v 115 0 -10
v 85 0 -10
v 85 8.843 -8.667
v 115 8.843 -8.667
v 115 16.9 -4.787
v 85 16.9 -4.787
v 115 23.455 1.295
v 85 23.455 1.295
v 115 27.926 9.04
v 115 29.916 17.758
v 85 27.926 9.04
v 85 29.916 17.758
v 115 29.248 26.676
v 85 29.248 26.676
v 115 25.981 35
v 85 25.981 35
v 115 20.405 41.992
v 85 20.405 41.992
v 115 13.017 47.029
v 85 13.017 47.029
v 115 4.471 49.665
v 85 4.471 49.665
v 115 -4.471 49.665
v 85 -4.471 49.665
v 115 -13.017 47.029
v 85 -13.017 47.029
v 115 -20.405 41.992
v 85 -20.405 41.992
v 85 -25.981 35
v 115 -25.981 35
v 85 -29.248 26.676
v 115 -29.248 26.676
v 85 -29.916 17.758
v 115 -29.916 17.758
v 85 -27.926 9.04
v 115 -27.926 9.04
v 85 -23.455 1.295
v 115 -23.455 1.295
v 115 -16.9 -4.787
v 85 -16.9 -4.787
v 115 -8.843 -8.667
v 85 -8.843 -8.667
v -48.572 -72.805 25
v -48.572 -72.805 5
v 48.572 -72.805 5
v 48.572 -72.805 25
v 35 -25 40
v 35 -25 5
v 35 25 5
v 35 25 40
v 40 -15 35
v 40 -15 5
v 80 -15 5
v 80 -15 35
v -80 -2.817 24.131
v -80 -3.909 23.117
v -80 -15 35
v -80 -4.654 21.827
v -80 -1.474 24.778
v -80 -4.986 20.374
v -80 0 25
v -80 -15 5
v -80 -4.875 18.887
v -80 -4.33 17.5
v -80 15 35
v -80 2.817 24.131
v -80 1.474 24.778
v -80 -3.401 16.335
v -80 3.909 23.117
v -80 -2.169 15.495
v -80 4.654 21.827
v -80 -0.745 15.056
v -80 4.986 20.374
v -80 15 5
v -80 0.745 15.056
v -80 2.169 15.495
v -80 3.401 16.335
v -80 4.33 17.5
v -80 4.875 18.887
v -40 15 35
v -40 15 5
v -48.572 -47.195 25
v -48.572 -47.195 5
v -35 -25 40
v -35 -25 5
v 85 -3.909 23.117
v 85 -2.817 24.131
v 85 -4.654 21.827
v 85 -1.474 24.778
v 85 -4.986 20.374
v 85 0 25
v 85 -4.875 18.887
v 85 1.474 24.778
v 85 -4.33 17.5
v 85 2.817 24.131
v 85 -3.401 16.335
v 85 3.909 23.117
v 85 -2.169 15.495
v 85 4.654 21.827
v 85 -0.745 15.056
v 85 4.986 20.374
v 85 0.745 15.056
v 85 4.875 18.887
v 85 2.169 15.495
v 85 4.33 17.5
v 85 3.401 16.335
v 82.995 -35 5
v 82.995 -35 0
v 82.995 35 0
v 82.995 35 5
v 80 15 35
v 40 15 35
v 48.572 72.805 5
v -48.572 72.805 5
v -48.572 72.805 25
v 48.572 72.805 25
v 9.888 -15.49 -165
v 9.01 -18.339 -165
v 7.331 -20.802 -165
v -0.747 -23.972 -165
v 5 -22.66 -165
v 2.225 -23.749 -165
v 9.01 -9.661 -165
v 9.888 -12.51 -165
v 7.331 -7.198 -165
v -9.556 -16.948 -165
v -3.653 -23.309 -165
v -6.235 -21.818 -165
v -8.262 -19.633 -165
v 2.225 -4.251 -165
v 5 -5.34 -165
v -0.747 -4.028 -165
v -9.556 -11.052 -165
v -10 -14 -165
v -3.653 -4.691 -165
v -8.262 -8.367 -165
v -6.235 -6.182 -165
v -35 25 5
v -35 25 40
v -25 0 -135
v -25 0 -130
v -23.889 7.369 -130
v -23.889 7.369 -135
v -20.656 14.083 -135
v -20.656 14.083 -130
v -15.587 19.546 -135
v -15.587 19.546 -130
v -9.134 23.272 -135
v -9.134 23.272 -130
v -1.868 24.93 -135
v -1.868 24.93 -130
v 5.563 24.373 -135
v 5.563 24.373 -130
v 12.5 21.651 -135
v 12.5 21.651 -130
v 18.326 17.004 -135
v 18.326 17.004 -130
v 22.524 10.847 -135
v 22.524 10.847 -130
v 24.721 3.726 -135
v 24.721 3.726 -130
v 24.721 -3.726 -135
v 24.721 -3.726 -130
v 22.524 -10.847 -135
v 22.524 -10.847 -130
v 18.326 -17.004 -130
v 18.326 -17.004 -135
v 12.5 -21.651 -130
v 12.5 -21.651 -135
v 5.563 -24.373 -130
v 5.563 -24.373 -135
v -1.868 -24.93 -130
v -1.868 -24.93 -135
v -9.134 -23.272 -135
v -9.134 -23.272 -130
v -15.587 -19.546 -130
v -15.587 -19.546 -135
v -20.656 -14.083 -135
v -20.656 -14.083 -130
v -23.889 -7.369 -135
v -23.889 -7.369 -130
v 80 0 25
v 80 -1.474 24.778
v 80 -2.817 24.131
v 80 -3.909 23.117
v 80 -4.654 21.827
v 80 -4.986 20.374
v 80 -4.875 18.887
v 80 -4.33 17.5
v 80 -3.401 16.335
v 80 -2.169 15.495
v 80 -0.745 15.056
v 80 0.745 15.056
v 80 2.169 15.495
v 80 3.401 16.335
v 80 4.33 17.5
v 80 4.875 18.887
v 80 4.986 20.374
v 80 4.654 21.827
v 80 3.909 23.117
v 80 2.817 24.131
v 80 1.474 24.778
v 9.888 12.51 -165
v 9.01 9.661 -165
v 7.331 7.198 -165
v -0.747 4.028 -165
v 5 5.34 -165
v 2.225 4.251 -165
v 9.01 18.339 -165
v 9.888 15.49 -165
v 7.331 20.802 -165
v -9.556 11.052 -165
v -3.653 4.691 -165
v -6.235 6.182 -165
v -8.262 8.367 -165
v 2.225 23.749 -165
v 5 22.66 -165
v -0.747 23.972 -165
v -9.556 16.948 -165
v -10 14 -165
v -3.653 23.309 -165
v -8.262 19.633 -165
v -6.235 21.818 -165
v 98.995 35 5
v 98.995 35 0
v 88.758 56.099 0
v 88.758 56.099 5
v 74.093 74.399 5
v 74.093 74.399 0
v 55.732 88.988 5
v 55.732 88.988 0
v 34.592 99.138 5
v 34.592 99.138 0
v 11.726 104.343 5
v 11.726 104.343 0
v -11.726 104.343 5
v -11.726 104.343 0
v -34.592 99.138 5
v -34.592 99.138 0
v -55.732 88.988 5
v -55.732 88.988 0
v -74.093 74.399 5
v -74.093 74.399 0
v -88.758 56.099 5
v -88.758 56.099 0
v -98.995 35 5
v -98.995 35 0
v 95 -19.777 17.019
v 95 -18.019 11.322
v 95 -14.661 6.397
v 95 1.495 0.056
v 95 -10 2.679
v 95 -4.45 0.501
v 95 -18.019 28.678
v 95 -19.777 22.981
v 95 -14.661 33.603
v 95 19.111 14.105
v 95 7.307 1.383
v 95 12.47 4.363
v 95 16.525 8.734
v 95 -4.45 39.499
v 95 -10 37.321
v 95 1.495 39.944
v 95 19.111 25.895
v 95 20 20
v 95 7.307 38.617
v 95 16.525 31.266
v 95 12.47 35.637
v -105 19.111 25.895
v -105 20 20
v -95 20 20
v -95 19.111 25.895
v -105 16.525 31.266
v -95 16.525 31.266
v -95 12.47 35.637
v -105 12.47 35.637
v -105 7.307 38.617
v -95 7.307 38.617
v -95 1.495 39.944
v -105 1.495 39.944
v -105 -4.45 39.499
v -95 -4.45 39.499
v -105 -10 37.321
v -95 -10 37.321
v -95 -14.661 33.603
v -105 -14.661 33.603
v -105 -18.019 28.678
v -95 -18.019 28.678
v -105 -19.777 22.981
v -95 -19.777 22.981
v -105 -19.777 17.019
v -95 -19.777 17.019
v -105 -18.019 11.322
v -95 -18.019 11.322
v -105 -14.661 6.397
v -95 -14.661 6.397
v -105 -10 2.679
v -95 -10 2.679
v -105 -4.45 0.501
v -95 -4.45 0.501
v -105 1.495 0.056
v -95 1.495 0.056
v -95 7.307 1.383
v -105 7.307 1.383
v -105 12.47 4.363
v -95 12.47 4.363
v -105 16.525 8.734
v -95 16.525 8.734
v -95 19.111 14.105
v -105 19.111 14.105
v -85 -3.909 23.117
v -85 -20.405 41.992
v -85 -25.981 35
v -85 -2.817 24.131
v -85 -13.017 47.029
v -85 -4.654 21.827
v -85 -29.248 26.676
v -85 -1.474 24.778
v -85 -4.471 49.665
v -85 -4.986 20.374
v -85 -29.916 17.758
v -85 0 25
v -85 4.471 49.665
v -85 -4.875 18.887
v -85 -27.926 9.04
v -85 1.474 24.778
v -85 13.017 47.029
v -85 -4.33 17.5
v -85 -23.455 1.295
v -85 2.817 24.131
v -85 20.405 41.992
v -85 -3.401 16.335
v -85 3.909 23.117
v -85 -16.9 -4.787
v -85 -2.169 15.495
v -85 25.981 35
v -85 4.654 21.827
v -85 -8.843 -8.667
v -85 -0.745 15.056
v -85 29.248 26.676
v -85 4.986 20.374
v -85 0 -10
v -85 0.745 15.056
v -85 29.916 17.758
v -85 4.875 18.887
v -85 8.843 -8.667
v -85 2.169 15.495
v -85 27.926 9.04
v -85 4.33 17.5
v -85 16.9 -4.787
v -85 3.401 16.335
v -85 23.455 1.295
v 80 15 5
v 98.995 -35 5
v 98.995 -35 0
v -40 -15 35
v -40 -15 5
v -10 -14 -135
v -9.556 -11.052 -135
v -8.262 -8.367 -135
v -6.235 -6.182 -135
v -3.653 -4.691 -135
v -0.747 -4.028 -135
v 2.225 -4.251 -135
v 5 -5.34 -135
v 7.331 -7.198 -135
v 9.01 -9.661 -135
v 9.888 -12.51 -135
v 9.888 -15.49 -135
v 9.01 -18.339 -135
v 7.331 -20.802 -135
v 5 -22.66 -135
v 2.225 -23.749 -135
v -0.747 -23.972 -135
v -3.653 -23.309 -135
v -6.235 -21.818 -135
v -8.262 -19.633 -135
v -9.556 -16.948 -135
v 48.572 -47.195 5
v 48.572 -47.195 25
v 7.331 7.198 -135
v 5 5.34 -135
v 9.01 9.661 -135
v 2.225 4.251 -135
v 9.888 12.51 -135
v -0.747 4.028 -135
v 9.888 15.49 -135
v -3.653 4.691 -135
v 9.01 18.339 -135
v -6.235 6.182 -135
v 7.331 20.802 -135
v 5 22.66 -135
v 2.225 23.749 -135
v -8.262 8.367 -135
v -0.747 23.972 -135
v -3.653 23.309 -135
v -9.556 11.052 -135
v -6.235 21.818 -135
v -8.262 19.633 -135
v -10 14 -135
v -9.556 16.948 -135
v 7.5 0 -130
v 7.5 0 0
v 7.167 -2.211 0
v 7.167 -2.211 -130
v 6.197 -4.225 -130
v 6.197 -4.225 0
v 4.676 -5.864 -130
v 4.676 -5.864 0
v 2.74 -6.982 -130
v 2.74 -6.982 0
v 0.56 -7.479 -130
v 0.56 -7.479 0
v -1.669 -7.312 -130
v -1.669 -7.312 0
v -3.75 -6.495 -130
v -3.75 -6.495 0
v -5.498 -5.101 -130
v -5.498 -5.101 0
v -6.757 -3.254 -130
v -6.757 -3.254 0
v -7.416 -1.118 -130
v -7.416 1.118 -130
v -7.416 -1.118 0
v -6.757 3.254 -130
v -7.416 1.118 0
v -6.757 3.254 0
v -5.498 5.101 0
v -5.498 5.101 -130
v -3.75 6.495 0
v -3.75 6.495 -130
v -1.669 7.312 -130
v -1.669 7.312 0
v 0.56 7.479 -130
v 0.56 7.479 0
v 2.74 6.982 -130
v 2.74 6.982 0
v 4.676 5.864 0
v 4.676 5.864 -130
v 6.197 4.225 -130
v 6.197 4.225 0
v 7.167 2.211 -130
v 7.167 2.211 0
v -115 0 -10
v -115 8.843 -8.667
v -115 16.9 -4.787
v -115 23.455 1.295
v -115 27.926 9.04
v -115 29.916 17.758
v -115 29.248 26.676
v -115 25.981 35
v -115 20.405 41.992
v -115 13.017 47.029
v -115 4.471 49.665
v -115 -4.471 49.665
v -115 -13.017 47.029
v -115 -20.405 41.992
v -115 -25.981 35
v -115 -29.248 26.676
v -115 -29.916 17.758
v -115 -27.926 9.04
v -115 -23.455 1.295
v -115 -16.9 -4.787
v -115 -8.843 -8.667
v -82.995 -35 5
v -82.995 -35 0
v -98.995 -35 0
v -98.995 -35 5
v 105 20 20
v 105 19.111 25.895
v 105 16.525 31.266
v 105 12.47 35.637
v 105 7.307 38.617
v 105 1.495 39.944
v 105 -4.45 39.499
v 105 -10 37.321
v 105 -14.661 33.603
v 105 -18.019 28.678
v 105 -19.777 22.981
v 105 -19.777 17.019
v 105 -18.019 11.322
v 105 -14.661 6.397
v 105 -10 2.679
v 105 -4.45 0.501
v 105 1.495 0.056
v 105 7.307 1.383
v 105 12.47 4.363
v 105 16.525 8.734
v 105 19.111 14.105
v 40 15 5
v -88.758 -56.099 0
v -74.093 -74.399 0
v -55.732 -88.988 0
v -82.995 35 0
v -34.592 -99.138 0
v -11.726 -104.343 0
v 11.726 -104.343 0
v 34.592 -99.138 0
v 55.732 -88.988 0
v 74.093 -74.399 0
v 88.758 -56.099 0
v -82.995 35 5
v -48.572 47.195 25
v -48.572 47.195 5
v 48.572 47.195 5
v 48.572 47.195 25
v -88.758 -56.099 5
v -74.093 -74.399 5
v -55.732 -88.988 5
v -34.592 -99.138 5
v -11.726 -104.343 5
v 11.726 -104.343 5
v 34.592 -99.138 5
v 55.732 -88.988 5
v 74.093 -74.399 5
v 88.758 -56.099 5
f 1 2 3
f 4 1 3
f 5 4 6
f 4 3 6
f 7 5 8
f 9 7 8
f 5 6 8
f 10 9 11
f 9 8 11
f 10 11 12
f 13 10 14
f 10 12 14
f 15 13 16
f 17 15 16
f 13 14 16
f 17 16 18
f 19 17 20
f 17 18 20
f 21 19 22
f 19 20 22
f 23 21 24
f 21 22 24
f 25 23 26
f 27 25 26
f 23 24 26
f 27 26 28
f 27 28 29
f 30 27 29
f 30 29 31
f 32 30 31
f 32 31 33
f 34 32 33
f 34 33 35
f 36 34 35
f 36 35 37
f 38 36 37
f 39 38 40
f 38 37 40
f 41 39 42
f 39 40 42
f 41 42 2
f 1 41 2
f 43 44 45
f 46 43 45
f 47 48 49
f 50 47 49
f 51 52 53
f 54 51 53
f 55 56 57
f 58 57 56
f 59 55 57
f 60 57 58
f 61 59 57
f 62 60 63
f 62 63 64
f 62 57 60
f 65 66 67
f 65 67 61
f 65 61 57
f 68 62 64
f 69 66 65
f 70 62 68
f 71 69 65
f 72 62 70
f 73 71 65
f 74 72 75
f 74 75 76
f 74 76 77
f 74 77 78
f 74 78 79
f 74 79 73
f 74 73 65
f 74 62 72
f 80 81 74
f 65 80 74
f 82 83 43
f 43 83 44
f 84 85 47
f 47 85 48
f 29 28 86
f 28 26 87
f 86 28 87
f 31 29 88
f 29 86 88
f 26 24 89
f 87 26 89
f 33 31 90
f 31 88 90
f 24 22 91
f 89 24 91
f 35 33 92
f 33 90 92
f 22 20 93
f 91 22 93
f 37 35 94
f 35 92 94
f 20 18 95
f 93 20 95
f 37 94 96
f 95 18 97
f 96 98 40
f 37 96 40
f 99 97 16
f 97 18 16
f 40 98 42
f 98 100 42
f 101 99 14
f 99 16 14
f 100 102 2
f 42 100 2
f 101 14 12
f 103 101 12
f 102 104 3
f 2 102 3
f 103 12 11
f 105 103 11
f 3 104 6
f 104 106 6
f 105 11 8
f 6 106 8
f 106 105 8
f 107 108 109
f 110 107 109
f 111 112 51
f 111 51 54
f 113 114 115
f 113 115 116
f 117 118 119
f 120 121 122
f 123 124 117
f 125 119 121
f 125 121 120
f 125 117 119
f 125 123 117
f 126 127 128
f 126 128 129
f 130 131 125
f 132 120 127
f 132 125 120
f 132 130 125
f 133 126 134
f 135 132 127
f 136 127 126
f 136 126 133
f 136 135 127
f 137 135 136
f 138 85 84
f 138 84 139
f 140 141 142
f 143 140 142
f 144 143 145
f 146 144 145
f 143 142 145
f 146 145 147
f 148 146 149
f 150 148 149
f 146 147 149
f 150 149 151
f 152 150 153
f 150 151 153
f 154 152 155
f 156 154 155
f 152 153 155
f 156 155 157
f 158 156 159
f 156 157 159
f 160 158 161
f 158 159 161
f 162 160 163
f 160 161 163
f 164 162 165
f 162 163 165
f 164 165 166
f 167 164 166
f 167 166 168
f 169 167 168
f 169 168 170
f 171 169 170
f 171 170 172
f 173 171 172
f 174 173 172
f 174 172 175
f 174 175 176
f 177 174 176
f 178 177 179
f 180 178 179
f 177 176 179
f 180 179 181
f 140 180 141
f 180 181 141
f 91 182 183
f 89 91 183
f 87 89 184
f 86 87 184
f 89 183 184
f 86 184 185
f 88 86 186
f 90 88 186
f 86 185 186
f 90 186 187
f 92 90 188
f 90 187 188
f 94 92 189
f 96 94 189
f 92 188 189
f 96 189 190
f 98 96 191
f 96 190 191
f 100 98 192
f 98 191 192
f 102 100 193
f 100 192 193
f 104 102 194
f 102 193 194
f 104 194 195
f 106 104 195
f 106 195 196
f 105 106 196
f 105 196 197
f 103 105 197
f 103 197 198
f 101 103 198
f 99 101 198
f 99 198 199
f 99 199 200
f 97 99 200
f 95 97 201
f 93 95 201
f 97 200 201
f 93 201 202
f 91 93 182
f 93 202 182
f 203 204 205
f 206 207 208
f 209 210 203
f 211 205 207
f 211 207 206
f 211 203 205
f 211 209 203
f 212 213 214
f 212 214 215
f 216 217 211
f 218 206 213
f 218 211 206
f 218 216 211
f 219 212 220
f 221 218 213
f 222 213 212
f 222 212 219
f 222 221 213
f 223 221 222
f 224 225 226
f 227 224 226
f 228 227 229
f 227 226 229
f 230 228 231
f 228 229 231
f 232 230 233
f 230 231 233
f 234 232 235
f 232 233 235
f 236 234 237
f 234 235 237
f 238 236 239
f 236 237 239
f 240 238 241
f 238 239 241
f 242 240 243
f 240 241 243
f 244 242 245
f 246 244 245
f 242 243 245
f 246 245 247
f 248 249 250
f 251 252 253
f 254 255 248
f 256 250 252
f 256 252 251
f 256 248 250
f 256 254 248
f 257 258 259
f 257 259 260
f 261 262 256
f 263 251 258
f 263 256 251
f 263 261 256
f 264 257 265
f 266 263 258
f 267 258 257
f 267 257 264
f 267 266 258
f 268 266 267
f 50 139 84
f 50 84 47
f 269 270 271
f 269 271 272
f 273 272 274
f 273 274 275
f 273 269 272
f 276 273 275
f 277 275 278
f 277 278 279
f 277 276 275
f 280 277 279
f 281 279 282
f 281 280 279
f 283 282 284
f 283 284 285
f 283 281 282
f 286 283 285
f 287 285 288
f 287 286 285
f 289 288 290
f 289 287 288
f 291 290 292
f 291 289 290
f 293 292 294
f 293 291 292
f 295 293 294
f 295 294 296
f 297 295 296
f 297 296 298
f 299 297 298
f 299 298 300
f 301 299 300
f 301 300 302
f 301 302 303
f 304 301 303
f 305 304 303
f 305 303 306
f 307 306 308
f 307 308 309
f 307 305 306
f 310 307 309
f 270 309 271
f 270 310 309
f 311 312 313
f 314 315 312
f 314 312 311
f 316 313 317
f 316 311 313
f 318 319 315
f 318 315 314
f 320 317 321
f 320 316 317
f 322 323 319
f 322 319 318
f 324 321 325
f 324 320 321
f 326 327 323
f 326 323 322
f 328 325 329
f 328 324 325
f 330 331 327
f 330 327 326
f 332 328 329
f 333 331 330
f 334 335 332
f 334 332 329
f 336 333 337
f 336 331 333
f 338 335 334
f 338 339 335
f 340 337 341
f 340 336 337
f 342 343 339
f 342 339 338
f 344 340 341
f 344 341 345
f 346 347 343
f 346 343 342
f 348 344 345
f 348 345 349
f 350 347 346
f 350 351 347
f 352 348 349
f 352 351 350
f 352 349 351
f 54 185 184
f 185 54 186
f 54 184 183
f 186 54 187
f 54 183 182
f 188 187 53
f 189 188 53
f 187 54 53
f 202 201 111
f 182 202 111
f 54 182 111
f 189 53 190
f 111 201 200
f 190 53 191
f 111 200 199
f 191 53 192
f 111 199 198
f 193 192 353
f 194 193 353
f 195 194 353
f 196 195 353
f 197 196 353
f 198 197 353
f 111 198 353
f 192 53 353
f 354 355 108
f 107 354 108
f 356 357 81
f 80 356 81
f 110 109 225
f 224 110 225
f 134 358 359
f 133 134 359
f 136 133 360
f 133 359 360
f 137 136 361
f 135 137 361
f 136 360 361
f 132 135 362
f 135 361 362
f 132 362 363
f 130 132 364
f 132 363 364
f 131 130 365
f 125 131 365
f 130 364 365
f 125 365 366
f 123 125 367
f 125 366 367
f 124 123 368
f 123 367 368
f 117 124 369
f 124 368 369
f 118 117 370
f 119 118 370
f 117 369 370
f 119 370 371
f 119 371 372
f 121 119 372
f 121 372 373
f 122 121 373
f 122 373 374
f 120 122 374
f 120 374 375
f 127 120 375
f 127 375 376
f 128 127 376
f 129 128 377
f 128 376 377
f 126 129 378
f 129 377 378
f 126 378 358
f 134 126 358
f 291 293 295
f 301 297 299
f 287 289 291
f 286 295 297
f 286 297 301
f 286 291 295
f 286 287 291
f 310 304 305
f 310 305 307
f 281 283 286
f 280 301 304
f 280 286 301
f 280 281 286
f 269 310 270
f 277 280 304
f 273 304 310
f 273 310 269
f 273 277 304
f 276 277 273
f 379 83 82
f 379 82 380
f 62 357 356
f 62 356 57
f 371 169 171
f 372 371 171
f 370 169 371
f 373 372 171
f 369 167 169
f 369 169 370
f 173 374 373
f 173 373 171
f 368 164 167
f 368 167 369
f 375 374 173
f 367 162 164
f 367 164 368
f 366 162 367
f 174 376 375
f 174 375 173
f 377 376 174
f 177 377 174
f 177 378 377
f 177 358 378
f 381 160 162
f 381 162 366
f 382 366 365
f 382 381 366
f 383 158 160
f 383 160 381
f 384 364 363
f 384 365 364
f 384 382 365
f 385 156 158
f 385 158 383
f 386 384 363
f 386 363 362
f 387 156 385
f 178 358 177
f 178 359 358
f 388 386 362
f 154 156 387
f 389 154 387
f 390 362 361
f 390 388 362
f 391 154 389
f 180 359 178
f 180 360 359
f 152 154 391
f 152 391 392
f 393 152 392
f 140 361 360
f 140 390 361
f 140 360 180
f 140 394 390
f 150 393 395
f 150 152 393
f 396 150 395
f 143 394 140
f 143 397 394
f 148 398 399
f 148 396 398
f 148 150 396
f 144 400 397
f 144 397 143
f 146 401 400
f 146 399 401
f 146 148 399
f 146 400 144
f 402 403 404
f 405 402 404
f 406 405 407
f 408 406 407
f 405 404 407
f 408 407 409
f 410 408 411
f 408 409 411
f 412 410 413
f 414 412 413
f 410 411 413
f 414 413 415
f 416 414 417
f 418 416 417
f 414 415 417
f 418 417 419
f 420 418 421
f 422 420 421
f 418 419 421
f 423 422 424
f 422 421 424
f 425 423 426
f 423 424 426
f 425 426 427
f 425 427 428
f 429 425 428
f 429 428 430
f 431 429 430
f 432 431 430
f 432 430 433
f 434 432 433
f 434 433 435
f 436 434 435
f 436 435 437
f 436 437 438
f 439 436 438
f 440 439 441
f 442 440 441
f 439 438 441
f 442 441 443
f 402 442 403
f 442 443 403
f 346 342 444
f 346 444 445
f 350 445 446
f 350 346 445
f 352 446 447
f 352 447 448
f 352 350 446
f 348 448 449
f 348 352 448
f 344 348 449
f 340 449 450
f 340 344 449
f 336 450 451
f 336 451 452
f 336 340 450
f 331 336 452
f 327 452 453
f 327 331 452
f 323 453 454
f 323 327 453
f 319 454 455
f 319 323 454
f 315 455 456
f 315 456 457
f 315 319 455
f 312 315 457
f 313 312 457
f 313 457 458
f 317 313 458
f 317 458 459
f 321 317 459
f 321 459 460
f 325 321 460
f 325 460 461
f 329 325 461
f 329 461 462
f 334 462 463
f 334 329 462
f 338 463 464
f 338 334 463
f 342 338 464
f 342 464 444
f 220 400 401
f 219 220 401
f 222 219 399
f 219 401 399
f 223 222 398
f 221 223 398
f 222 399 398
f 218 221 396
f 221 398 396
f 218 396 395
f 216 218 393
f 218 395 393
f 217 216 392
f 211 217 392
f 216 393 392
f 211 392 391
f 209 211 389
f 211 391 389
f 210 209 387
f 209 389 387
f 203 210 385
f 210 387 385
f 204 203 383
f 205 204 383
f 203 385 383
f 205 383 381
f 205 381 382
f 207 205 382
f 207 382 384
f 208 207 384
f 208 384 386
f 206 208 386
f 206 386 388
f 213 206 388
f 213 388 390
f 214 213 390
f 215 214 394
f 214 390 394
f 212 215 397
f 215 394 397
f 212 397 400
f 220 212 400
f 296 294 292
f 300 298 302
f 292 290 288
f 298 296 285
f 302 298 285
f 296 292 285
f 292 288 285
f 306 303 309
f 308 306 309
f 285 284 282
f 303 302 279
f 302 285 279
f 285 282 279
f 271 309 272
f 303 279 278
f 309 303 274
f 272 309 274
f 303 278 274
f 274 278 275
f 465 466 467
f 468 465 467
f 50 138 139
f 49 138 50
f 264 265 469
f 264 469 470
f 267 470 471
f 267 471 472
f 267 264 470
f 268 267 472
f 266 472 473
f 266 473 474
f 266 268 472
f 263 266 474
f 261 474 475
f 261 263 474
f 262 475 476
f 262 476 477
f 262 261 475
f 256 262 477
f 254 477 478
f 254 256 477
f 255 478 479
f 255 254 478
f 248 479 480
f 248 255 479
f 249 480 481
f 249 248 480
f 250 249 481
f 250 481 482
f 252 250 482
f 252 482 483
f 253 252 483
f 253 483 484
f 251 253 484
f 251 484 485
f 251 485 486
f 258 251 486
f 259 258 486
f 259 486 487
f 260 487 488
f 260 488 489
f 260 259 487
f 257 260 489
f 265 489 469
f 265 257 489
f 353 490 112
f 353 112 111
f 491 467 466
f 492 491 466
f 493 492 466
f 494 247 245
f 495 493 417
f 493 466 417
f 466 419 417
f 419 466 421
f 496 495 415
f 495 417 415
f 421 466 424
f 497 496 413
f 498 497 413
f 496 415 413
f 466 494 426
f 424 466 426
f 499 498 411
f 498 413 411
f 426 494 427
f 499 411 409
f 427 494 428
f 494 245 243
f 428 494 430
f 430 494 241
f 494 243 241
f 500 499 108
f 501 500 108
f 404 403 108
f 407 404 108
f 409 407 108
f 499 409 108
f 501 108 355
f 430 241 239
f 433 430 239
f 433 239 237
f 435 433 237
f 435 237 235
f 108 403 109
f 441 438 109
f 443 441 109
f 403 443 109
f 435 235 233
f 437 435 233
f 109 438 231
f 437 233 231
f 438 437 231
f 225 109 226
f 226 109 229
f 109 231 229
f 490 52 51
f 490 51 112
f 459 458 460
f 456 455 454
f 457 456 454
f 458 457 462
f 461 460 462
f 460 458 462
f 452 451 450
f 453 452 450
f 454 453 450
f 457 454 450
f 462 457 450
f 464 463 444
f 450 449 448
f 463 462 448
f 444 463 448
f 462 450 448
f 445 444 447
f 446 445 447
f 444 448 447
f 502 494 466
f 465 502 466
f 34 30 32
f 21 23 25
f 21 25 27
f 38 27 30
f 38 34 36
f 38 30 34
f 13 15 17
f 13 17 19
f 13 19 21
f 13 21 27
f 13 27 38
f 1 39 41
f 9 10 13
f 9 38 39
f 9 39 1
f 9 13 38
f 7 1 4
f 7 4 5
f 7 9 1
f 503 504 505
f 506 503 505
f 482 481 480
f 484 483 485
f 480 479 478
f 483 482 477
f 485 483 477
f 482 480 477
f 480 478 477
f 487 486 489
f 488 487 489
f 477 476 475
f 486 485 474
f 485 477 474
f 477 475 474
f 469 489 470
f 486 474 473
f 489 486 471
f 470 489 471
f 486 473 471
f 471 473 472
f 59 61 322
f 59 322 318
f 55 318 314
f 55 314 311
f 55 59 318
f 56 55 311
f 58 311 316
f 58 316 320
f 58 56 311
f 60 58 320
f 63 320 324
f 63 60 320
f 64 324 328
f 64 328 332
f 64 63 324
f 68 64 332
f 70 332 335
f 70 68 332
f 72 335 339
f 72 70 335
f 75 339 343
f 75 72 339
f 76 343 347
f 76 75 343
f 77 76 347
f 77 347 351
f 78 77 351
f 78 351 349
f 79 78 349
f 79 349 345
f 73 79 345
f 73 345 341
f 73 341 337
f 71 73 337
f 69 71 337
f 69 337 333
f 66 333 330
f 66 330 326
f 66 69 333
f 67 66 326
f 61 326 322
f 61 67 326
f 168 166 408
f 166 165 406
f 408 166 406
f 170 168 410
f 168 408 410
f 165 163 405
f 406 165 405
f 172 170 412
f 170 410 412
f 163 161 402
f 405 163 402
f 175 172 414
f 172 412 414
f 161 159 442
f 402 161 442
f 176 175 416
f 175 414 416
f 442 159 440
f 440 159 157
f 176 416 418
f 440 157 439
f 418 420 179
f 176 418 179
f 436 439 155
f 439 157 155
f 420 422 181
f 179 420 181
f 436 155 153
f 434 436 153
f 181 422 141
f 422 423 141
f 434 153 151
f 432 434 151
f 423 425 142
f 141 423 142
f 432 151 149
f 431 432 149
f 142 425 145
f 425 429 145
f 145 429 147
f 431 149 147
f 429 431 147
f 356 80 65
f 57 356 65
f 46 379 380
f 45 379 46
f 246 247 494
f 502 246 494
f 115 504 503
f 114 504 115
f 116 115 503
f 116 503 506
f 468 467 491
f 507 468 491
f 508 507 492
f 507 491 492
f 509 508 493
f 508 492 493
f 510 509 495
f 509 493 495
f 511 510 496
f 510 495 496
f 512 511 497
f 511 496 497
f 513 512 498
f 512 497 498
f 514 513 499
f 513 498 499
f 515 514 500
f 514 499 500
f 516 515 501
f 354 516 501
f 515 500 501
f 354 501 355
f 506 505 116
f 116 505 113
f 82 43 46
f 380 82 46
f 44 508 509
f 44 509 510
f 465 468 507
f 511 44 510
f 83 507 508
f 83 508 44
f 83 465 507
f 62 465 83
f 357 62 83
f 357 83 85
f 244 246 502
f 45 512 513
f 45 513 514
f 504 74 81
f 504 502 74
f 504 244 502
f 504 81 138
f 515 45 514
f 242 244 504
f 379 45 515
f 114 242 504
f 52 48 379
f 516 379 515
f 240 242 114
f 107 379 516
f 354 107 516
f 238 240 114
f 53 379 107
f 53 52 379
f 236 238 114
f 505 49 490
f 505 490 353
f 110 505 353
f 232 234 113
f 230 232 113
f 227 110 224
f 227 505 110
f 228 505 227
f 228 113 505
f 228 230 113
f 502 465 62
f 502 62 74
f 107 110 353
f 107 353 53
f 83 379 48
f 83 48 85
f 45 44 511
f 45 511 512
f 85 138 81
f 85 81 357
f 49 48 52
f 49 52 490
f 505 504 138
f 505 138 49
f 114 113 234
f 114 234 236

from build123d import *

# Parameters (mm, degrees)
BOSS_EXTRUDE1_DEPTH = 5
SKETCH2_W           = 70
SKETCH2_H           = 50
BOSS_EXTRUDE2_DEPTH = 35
SKETCH3_W           = 40
SKETCH3_H           = 30
BOSS_EXTRUDE3_DEPTH = 30
SKETCH4_R           = 5
BOSS_EXTRUDE4_DEPTH = 5
SKETCH5_R           = 30
BOSS_EXTRUDE5_DEPTH = 30
SKETCH6_R           = 7.5
BOSS_EXTRUDE6_DEPTH = 130
SKETCH7_R           = 25
BOSS_EXTRUDE7_DEPTH = 5
SKETCH9_R           = 10
BOSS_EXTRUDE8_DEPTH = 30
SKETCH10_W          = 97.144237238
SKETCH10_H          = 25.610753454
BOSS_EXTRUDE9_DEPTH = 20
SHELL1_START        = -105
SHELL1_OUTLINE_R    = 20
SHELL1_DEPTH        = 10
SHELL1_START_2      = 95
SHELL1_2_OUTLINE_R  = 20
SHELL1_2_DEPTH      = 10


# Read off the part's stored shape, not the designer's step: Shell1
with BuildPart() as part:
    # Sketch1 → Boss-Extrude1 (new body)
    with BuildSketch(Plane.XY):
        with BuildLine():
            Line((-98.994949366, 35), (-82.994949366, 35))
            Line((-82.994949366, 35), (-82.994949366, 0))
            Line((-82.994949366, 0), (-82.994949366, -35))
            Line((-82.994949366, -35), (-98.994949366, -35))
            ThreePointArc((-98.994949366, -35), (0, -105), (98.994949366, -35))
            Line((98.994949366, -35), (82.994949366, -35))
            Line((82.994949366, -35), (82.994949366, 0))
            Line((82.994949366, 0), (82.994949366, 35))
            Line((82.994949366, 35), (98.994949366, 35))
            ThreePointArc((98.994949366, 35), (0, 105), (-98.994949366, 35))
        make_face()
    extrude(amount=BOSS_EXTRUDE1_DEPTH)

    # Sketch2 → Boss-Extrude2 (add)
    with BuildSketch(Plane.XY.offset(5)):
        Rectangle(SKETCH2_W, SKETCH2_H)
    extrude(amount=BOSS_EXTRUDE2_DEPTH)

    # Sketch3 → Boss-Extrude3 (add)
    with BuildSketch(Plane.XY.offset(5)):
        with Locations((60, 0)):
            Rectangle(SKETCH3_W, SKETCH3_H)
    boss_extrude3 = extrude(amount=BOSS_EXTRUDE3_DEPTH)

    # Sketch4 → Boss-Extrude4 (add)
    with BuildSketch(Plane(origin=(80, 0, 0), x_dir=(0, 0, -1), z_dir=(1, 0, 0))):
        with Locations(Location((-20, 0, 0), (0, 0, 180))):
            Circle(SKETCH4_R)
    boss_extrude4 = extrude(amount=BOSS_EXTRUDE4_DEPTH)

    # Sketch5 → Boss-Extrude5 (add)
    with BuildSketch(Plane(origin=(85, 0, 0), x_dir=(0, 0, -1), z_dir=(1, 0, 0))):
        with Locations((-20, 0)):
            Circle(SKETCH5_R)
    boss_extrude5 = extrude(amount=BOSS_EXTRUDE5_DEPTH)

    # Mirror1: Boss-Extrude3, Boss-Extrude4, Boss-Extrude5 across plane
    add(boss_extrude3.mirror(Plane(origin=(0, 0, 0), x_dir=(0, 0, 1), z_dir=(1, 0, 0))))
    add(boss_extrude4.mirror(Plane(origin=(0, 0, 0), x_dir=(0, 0, 1), z_dir=(1, 0, 0))))
    add(boss_extrude5.mirror(Plane(origin=(0, 0, 0), x_dir=(0, 0, 1), z_dir=(1, 0, 0))))

    # Sketch6 → Boss-Extrude6 (add)
    with BuildSketch(Plane(origin=(0, 0, 0), x_dir=(-1, 0, 0), z_dir=(0, 0, -1))):
        with Locations(Location((0, 0, 0), (0, 0, 180))):
            Circle(SKETCH6_R)
    extrude(amount=BOSS_EXTRUDE6_DEPTH)

    # Sketch7 → Boss-Extrude7 (add)
    with BuildSketch(Plane(origin=(0, 0, -130), x_dir=(-1, 0, 0), z_dir=(0, 0, -1))):
        Circle(SKETCH7_R)
    extrude(amount=BOSS_EXTRUDE7_DEPTH)

    # Sketch9 → Boss-Extrude8 (add)
    with BuildSketch(Plane(origin=(0, 0, -135), x_dir=(-1, 0, 0), z_dir=(0, 0, -1))):
        with Locations((0, 14)):
            Circle(SKETCH9_R)
        with Locations((0, -14)):
            Circle(SKETCH9_R)
    extrude(amount=BOSS_EXTRUDE8_DEPTH)

    # Sketch10 → Boss-Extrude9 (add)
    with BuildSketch(Plane.XY.offset(5)):
        with Locations((0, 60)):
            Rectangle(SKETCH10_W, SKETCH10_H)
    boss_extrude9 = extrude(amount=BOSS_EXTRUDE9_DEPTH)

    # Mirror2: Boss-Extrude9 across plane
    add(boss_extrude9.mirror(Plane.ZX))

    # Shell1 outline → Shell1 (cut)
    with BuildSketch(Plane.YZ.offset(SHELL1_START)):
        with Locations((0, 20)):
            Circle(SHELL1_OUTLINE_R)
    extrude(amount=SHELL1_DEPTH, mode=Mode.SUBTRACT)

    # Shell1 2 outline → Shell1 2 (cut)
    with BuildSketch(Plane.YZ.offset(SHELL1_START_2)):
        with Locations((0, 20)):
            Circle(SHELL1_2_OUTLINE_R)
    extrude(amount=SHELL1_2_DEPTH, mode=Mode.SUBTRACT)


solid = part.part
